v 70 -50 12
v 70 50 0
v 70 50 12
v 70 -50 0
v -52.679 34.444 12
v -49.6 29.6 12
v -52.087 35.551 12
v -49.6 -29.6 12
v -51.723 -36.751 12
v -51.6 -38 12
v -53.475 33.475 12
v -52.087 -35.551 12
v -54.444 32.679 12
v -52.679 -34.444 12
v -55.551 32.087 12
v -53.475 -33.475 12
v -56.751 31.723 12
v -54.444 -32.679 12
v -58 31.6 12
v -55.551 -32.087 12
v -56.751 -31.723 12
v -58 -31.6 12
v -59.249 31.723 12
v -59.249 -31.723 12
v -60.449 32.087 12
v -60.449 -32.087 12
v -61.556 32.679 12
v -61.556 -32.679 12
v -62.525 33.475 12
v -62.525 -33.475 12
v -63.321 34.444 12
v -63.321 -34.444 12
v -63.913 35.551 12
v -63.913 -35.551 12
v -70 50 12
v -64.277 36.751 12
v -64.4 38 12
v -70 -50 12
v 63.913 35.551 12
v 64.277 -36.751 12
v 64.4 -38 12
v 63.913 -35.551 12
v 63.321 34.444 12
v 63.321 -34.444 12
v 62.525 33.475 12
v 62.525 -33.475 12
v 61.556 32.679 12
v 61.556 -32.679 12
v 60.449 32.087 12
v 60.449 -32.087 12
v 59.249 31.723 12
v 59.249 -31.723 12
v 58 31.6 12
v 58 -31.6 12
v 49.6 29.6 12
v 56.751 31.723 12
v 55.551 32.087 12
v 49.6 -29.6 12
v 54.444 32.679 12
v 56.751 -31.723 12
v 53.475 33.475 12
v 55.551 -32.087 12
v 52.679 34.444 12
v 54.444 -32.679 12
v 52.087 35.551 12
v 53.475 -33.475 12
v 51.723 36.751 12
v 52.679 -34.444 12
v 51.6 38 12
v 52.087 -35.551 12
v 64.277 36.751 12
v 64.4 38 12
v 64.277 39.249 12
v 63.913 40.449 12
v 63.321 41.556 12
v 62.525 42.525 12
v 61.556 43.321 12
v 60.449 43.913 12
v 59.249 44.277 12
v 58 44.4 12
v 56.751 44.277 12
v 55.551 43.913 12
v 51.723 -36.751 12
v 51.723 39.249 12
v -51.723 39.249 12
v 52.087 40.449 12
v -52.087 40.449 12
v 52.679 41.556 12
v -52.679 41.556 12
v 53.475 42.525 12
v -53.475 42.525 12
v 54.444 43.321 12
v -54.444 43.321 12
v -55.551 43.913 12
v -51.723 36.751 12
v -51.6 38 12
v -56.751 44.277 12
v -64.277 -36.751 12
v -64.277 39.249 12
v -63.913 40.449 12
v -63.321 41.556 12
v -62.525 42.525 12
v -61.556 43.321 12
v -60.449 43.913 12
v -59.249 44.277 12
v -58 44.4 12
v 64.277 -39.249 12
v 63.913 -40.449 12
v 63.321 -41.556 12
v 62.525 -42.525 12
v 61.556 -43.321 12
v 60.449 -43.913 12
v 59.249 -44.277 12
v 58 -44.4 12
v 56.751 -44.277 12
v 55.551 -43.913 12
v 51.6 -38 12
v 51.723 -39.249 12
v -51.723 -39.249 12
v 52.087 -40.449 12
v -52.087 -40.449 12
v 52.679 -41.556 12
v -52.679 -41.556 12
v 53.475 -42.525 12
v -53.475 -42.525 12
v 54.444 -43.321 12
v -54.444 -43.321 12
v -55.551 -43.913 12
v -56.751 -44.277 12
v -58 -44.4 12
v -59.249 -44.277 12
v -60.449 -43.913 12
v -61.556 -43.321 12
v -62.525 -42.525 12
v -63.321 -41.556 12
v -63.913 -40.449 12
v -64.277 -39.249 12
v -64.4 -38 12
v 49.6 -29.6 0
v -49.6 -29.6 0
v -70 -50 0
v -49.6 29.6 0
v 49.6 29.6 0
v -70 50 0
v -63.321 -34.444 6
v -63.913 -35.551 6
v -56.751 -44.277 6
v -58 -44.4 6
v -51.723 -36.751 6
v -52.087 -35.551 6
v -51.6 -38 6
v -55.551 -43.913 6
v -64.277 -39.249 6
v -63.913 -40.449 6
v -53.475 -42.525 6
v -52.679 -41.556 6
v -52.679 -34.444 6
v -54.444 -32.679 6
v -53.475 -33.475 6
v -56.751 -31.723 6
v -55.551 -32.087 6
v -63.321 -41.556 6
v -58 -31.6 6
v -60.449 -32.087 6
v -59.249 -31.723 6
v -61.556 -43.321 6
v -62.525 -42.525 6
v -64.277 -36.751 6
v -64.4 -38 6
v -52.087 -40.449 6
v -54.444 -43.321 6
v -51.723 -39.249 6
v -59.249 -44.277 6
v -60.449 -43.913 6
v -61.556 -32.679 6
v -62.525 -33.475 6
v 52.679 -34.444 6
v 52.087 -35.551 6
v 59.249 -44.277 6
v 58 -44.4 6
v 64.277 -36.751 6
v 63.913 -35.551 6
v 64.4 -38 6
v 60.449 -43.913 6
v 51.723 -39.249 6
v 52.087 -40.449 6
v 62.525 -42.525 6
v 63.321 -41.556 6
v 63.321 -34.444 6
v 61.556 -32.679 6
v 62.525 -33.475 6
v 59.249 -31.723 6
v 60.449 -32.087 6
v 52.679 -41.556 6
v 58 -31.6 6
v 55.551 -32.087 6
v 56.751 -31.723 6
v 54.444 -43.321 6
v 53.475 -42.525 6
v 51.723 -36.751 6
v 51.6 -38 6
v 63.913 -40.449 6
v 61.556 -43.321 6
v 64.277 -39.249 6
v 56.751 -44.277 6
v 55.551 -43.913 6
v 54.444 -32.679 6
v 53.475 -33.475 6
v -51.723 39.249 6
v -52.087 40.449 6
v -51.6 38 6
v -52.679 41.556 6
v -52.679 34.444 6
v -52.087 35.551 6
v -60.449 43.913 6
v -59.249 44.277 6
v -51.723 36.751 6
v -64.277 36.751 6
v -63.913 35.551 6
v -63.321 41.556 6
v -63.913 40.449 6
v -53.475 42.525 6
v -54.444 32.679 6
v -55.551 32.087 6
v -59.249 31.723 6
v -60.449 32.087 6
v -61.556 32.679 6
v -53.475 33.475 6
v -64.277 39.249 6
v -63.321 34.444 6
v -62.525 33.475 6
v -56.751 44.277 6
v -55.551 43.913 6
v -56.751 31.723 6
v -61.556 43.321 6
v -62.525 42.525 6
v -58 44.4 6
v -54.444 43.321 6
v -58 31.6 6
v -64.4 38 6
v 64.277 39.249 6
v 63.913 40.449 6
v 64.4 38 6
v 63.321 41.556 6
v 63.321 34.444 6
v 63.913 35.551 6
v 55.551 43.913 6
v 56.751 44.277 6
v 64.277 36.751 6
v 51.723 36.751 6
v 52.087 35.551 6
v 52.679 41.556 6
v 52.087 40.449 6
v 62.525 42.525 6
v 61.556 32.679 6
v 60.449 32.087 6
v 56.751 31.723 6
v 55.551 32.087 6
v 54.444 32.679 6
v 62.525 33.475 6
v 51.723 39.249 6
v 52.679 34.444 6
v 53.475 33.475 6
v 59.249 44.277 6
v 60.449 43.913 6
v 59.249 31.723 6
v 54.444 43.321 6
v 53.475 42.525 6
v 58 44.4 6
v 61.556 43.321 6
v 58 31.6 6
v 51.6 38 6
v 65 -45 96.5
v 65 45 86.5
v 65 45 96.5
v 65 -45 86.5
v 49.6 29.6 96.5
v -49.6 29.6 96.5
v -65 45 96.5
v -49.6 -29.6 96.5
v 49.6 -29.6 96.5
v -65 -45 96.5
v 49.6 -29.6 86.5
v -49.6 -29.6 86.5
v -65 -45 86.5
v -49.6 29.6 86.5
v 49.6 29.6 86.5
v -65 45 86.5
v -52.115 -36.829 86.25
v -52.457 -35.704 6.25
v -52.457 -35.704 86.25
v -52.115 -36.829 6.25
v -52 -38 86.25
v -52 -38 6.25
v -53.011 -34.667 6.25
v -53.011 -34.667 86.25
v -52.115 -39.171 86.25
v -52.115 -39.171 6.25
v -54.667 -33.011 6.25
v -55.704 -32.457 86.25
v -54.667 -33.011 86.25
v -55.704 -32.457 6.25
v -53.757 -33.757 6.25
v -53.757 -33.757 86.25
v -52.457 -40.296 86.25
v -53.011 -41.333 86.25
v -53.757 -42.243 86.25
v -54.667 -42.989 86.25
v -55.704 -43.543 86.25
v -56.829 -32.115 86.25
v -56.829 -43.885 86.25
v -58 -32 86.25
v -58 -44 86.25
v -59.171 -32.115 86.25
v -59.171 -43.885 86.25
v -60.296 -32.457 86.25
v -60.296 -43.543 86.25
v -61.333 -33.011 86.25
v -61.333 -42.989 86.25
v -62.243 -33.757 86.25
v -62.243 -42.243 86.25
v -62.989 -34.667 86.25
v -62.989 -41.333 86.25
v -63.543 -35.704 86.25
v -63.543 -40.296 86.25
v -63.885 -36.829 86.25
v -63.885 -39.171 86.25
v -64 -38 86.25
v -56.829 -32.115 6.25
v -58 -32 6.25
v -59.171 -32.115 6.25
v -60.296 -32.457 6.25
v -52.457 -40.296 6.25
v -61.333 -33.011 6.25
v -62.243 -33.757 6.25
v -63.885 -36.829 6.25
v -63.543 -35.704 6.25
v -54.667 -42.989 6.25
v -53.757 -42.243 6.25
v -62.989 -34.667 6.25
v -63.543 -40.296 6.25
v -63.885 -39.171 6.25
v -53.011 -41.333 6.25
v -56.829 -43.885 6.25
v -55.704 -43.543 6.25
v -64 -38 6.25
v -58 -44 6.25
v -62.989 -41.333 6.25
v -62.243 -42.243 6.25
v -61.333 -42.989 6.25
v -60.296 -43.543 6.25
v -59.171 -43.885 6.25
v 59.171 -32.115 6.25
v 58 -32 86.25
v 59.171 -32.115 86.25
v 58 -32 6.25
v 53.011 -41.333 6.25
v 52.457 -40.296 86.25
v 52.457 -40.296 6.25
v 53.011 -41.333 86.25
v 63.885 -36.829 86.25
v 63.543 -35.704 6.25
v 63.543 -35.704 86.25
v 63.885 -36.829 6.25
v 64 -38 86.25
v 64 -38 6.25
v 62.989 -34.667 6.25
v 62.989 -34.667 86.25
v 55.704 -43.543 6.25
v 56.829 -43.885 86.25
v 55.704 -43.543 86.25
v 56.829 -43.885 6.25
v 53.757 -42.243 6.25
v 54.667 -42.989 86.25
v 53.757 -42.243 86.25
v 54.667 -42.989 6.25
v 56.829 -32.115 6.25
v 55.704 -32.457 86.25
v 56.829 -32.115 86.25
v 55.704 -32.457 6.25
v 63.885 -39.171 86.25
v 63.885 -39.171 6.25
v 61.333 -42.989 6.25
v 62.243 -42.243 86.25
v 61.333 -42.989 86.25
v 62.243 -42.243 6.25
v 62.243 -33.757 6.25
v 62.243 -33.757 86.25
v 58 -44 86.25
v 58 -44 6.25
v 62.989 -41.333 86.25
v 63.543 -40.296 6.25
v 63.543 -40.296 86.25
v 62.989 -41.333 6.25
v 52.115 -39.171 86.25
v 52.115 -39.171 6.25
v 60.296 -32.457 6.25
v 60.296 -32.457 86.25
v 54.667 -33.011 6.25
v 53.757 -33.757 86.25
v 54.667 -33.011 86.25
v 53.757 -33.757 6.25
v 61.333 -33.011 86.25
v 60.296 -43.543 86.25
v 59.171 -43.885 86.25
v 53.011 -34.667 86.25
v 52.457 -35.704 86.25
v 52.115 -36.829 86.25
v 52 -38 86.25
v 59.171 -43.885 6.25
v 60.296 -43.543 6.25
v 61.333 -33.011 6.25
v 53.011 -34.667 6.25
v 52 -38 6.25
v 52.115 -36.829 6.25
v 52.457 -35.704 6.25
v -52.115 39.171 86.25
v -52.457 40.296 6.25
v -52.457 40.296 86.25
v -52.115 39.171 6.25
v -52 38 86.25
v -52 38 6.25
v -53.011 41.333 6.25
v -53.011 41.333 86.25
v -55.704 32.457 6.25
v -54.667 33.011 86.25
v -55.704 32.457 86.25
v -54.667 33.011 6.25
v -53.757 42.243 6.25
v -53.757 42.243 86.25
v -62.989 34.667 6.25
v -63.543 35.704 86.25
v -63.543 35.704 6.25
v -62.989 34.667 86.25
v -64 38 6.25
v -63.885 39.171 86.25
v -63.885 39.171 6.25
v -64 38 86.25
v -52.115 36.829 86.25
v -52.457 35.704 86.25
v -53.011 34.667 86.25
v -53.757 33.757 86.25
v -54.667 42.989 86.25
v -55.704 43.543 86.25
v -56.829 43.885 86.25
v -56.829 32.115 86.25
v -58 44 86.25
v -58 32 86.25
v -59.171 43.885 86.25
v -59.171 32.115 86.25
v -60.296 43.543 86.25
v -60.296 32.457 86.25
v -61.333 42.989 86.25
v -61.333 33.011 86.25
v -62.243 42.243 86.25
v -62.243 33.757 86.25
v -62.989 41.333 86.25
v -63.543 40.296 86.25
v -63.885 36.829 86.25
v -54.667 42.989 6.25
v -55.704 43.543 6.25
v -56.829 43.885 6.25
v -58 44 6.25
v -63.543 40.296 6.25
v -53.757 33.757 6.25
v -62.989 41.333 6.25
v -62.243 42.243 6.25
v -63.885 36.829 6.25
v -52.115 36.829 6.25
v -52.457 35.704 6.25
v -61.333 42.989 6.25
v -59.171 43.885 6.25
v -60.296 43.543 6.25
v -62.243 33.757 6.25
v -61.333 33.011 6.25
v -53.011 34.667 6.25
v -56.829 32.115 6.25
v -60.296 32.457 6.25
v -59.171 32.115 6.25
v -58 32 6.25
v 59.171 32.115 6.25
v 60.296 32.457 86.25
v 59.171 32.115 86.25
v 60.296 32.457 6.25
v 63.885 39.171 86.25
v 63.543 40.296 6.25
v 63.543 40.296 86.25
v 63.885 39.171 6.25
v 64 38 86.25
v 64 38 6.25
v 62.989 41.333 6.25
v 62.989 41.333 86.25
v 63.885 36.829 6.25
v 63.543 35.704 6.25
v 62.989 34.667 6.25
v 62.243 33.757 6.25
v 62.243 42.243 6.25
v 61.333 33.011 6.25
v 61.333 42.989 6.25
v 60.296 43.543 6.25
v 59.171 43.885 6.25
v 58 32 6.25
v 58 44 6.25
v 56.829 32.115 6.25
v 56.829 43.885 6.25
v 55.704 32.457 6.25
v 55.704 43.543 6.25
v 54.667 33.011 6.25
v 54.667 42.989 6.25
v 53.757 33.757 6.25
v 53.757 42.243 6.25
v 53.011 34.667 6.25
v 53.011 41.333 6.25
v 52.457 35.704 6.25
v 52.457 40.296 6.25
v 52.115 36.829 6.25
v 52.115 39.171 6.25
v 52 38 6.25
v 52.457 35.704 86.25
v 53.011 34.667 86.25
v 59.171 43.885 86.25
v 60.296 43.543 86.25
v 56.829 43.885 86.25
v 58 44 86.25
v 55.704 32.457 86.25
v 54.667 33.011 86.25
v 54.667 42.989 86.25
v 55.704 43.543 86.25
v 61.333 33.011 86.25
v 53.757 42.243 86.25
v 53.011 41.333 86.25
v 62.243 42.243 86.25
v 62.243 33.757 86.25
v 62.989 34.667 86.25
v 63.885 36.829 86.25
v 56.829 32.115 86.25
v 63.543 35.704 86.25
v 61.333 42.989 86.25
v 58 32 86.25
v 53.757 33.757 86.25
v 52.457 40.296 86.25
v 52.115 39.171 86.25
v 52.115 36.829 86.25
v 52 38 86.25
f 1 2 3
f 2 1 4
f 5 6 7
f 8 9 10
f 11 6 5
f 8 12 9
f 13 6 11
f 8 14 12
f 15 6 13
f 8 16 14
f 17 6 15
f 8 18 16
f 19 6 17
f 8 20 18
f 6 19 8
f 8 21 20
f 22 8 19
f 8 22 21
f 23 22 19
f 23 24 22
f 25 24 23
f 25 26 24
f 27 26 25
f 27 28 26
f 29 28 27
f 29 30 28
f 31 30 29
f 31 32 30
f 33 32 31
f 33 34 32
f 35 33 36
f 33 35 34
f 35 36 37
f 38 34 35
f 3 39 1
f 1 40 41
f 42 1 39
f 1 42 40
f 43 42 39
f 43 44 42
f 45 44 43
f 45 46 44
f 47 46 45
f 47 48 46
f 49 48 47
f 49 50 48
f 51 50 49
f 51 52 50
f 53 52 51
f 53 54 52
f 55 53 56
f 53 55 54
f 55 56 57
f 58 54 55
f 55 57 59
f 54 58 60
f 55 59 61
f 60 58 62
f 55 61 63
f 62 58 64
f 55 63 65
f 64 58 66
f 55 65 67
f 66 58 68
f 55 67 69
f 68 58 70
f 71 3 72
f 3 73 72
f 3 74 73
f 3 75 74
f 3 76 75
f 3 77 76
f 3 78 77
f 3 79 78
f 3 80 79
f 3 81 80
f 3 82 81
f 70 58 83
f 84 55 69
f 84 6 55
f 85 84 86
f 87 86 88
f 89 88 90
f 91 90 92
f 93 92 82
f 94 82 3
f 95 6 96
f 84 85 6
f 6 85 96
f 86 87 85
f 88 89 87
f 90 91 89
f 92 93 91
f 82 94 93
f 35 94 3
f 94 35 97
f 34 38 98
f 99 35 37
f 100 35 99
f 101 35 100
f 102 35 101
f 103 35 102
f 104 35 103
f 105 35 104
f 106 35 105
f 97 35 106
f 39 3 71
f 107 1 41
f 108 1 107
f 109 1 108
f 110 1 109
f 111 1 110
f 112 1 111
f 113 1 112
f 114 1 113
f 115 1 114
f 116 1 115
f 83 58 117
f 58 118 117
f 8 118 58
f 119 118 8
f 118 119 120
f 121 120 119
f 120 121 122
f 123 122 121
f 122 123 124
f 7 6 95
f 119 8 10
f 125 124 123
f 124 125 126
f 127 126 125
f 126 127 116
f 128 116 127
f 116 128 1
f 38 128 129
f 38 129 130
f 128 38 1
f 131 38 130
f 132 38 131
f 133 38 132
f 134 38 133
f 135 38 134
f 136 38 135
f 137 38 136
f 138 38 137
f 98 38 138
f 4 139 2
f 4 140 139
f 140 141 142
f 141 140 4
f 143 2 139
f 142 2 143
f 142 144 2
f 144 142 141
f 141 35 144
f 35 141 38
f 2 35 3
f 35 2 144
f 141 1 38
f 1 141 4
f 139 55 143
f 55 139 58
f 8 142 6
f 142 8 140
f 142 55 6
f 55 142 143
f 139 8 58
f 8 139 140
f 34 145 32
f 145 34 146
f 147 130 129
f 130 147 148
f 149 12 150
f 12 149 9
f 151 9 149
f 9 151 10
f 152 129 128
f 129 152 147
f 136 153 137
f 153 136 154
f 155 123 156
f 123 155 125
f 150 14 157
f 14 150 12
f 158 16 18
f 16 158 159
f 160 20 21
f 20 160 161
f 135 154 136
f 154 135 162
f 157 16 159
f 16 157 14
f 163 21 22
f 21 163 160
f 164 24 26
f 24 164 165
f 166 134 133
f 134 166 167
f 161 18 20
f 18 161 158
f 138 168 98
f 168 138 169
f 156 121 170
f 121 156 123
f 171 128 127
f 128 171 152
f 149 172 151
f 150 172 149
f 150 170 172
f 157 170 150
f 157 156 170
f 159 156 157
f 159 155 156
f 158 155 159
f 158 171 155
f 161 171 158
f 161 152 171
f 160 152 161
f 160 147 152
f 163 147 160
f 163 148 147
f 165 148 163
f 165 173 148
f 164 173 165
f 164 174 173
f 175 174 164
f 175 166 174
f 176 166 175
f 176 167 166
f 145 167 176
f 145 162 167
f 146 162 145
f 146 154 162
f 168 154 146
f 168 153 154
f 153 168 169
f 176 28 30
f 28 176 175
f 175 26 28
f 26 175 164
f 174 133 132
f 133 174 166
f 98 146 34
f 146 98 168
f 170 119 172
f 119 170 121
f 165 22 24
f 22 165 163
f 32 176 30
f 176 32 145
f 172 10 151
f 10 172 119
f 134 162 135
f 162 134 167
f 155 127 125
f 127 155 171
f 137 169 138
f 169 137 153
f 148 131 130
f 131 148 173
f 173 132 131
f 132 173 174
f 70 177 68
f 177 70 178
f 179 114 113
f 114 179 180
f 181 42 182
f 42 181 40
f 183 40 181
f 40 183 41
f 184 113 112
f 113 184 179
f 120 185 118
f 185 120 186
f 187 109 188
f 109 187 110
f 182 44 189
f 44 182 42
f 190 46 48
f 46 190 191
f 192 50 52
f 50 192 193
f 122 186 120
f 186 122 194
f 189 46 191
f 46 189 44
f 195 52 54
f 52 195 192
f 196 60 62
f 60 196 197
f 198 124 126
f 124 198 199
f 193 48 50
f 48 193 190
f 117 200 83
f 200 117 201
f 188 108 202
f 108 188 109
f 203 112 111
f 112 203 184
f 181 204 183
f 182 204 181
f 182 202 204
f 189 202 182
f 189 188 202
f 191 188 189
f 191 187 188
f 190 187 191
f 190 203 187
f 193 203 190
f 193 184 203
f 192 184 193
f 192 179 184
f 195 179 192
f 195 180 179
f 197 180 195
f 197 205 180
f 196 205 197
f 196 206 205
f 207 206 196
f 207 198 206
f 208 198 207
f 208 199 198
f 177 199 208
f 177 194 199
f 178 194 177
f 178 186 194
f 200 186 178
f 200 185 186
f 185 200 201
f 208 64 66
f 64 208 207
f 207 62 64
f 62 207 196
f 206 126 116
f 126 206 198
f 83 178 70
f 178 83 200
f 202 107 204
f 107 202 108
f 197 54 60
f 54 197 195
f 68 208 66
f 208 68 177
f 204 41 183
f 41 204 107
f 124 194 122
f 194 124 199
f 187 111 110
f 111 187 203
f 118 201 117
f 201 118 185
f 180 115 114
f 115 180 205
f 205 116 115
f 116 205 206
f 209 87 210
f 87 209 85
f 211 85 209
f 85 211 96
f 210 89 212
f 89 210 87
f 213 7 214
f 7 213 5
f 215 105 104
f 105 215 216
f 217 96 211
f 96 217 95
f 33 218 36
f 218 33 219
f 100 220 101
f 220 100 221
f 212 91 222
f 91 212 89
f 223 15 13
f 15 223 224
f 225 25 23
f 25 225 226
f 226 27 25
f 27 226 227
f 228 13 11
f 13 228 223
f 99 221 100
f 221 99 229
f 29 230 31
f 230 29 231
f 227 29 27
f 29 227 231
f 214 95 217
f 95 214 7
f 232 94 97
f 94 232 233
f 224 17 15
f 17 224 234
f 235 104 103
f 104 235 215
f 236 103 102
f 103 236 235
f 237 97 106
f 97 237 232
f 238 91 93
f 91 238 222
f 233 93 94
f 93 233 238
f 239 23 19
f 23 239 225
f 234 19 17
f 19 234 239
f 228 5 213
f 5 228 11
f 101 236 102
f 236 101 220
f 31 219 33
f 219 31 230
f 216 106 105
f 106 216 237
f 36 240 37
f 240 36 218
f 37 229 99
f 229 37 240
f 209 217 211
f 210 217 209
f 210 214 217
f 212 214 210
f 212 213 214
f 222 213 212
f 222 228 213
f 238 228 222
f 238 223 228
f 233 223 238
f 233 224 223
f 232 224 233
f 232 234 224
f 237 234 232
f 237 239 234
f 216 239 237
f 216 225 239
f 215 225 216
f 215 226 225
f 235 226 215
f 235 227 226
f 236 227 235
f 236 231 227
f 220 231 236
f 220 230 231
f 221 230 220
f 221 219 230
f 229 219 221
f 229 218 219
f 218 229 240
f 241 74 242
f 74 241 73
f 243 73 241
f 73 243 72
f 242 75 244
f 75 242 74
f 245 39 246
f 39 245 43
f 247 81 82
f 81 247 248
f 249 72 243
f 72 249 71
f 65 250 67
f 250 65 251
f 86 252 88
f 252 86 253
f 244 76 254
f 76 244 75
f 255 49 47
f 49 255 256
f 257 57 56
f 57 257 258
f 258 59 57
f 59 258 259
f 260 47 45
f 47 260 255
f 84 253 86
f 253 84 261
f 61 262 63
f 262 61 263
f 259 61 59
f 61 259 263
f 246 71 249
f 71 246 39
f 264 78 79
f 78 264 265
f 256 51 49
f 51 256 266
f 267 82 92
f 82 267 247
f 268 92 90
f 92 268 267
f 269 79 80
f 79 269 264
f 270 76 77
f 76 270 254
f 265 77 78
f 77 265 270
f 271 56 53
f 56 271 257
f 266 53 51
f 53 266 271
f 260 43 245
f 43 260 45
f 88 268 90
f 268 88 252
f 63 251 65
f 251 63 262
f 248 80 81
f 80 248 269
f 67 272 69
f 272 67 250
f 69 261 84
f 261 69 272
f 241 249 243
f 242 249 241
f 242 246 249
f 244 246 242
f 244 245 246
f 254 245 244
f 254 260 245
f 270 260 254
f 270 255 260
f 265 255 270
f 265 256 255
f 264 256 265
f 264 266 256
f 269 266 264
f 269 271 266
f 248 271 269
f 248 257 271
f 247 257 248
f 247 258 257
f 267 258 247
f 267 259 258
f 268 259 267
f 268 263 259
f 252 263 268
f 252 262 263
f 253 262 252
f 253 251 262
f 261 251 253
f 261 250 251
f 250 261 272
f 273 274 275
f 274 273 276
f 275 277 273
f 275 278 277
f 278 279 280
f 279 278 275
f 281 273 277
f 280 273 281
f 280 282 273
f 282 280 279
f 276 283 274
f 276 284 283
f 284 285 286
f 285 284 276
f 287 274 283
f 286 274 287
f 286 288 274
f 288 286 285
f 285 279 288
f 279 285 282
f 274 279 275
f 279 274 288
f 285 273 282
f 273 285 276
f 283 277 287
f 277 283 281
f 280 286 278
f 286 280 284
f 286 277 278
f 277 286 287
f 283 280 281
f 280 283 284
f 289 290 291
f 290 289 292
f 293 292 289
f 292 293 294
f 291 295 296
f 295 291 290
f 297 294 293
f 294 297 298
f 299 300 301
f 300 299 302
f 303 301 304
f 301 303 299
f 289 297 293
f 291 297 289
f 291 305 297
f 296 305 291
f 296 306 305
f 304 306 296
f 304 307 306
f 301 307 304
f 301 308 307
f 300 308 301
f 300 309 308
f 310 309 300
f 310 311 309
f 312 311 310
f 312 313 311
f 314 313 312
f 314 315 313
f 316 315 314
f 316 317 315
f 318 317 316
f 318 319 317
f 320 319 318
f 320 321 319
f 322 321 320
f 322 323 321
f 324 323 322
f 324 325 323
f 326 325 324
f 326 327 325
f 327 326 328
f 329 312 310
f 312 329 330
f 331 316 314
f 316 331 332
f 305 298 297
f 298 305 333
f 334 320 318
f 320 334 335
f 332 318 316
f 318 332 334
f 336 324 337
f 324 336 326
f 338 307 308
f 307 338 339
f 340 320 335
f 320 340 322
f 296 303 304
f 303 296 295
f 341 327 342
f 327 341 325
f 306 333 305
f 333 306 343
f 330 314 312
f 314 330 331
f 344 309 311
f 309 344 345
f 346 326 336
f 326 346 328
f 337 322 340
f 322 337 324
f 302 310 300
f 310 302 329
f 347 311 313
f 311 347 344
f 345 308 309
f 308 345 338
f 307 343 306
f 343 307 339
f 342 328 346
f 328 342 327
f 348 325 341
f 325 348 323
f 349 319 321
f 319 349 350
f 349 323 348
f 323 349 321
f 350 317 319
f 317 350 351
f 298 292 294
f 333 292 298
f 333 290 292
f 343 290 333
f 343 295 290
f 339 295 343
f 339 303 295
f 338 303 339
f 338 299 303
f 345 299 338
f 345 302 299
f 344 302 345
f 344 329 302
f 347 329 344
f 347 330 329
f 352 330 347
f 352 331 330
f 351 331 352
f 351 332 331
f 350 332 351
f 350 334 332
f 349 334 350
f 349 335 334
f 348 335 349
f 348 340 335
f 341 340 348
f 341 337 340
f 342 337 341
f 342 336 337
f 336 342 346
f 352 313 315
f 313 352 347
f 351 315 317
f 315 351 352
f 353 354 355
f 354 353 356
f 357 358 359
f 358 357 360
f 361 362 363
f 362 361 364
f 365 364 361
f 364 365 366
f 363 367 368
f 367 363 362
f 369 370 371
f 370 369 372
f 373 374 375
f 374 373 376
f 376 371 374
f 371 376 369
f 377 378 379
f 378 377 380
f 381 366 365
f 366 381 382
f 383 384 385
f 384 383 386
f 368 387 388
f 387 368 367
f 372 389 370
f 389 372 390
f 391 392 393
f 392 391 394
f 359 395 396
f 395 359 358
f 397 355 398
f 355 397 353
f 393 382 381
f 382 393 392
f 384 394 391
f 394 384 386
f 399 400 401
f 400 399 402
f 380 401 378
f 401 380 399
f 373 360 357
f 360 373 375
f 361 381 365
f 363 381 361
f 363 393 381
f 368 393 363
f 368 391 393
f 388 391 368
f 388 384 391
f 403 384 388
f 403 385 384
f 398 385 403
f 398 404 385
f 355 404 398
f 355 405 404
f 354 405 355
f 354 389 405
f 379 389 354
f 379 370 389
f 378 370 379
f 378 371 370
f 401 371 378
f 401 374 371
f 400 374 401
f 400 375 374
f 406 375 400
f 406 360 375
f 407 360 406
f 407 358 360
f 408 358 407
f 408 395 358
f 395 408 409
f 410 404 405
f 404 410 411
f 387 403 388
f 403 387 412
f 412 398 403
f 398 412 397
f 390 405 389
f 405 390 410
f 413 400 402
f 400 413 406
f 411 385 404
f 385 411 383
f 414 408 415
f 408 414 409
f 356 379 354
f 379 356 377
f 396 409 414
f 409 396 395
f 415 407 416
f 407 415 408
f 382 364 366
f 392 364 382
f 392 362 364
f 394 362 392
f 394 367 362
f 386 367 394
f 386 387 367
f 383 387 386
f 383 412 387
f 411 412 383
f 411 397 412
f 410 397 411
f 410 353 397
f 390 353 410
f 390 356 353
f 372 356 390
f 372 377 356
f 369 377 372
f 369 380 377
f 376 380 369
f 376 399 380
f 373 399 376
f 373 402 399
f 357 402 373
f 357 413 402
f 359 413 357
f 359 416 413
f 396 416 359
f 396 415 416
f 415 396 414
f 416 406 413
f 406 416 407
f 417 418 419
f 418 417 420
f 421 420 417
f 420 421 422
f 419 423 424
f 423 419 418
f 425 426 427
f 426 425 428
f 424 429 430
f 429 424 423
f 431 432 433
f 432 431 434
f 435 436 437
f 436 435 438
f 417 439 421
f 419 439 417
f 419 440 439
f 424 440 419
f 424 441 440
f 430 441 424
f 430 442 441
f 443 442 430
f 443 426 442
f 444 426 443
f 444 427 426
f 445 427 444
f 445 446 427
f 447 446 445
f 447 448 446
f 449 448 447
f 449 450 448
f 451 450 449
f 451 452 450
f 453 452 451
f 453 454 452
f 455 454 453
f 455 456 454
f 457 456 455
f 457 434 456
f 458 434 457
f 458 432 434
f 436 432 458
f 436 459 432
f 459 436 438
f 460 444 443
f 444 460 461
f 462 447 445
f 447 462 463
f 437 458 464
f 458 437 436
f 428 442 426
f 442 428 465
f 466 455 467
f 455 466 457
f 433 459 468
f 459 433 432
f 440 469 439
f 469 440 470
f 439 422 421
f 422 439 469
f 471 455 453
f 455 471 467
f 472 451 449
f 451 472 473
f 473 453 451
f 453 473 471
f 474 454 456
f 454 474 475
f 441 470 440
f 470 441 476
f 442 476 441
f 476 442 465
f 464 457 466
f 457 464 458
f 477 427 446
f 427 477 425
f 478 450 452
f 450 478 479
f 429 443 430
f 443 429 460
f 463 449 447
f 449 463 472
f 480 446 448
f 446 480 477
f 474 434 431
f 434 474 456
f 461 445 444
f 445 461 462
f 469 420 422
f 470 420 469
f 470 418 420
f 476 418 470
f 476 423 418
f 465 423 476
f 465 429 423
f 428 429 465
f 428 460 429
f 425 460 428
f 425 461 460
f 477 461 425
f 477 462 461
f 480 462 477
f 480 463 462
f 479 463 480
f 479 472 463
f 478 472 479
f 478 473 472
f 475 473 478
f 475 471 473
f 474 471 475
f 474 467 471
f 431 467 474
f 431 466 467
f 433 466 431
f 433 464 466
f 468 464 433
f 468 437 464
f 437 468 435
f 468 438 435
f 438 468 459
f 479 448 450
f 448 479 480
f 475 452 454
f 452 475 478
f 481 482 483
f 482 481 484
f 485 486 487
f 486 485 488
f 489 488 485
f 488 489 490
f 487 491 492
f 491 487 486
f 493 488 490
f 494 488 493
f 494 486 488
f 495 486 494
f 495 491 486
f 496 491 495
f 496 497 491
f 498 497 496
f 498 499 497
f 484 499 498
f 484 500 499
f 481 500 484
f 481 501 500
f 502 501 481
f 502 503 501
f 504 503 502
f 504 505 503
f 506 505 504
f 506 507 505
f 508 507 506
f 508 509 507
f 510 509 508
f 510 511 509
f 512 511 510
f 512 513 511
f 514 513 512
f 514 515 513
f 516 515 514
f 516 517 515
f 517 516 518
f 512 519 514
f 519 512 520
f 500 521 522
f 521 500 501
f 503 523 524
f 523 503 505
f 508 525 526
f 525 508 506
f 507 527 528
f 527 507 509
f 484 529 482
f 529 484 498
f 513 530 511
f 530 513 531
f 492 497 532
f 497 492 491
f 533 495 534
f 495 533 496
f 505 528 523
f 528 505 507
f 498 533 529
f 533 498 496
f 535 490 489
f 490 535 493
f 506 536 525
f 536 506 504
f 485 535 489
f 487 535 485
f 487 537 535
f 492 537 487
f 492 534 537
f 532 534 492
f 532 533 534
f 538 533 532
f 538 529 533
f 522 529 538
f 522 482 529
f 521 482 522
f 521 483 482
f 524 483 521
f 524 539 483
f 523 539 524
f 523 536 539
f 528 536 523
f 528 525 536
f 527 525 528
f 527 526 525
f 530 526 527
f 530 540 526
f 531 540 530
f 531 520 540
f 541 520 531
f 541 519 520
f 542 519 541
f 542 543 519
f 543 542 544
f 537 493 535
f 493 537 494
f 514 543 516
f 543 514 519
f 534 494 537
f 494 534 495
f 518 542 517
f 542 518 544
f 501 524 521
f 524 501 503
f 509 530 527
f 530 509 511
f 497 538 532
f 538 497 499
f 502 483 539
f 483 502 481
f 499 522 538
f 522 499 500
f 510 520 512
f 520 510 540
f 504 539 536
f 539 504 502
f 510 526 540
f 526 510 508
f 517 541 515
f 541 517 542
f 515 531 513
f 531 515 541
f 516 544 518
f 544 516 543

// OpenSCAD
$fn = 32;

// ------------------------------------------------------------------------
// Frame cube: base 140 x 100 mm, posts 80 mm tall
// Every part is its own module, assembly() places every instance.
// ------------------------------------------------------------------------

// --- part 1 ---
module base_frame() {
  difference() {
    translate([-70, -50, 0]) cube([140, 100, 12]);
    translate([-49.6, -29.6, -1]) cube([99.2, 59.2, 14]);
    translate([-58, -38, 6]) cylinder(h = 7, d = 12.8);
    translate([58, -38, 6]) cylinder(h = 7, d = 12.8);
    translate([-58, 38, 6]) cylinder(h = 7, d = 12.8);
    translate([58, 38, 6]) cylinder(h = 7, d = 12.8);
  }
}

// --- part 2 ---
module corner_post() {
  cylinder(h = 80, d = 12);
}

// --- part 3 ---
module top_frame() {
  difference() {
    translate([-65, -45, 0]) cube([130, 90, 10]);
    translate([-49.6, -29.6, -1]) cube([99.2, 59.2, 12]);
  }
}

// --- assembly ---
module assembly() {
  color([0.80, 0.24, 0.20]) translate([0, 0, 0]) rotate([0, 0, 0]) base_frame();
  color([0.20, 0.45, 0.75]) translate([-58, -38, 6.25]) rotate([0, 0, 0]) corner_post();
  color([0.25, 0.62, 0.32]) translate([58, -38, 6.25]) rotate([0, 0, 0]) corner_post();
  color([0.92, 0.70, 0.18]) translate([-58, 38, 6.25]) rotate([0, 0, 0]) corner_post();
  color([0.58, 0.35, 0.70]) translate([58, 38, 6.25]) rotate([0, 0, 0]) corner_post();
  color([0.16, 0.66, 0.66]) translate([0, 0, 86.5]) rotate([0, 0, 0]) top_frame();
}

assembly();
